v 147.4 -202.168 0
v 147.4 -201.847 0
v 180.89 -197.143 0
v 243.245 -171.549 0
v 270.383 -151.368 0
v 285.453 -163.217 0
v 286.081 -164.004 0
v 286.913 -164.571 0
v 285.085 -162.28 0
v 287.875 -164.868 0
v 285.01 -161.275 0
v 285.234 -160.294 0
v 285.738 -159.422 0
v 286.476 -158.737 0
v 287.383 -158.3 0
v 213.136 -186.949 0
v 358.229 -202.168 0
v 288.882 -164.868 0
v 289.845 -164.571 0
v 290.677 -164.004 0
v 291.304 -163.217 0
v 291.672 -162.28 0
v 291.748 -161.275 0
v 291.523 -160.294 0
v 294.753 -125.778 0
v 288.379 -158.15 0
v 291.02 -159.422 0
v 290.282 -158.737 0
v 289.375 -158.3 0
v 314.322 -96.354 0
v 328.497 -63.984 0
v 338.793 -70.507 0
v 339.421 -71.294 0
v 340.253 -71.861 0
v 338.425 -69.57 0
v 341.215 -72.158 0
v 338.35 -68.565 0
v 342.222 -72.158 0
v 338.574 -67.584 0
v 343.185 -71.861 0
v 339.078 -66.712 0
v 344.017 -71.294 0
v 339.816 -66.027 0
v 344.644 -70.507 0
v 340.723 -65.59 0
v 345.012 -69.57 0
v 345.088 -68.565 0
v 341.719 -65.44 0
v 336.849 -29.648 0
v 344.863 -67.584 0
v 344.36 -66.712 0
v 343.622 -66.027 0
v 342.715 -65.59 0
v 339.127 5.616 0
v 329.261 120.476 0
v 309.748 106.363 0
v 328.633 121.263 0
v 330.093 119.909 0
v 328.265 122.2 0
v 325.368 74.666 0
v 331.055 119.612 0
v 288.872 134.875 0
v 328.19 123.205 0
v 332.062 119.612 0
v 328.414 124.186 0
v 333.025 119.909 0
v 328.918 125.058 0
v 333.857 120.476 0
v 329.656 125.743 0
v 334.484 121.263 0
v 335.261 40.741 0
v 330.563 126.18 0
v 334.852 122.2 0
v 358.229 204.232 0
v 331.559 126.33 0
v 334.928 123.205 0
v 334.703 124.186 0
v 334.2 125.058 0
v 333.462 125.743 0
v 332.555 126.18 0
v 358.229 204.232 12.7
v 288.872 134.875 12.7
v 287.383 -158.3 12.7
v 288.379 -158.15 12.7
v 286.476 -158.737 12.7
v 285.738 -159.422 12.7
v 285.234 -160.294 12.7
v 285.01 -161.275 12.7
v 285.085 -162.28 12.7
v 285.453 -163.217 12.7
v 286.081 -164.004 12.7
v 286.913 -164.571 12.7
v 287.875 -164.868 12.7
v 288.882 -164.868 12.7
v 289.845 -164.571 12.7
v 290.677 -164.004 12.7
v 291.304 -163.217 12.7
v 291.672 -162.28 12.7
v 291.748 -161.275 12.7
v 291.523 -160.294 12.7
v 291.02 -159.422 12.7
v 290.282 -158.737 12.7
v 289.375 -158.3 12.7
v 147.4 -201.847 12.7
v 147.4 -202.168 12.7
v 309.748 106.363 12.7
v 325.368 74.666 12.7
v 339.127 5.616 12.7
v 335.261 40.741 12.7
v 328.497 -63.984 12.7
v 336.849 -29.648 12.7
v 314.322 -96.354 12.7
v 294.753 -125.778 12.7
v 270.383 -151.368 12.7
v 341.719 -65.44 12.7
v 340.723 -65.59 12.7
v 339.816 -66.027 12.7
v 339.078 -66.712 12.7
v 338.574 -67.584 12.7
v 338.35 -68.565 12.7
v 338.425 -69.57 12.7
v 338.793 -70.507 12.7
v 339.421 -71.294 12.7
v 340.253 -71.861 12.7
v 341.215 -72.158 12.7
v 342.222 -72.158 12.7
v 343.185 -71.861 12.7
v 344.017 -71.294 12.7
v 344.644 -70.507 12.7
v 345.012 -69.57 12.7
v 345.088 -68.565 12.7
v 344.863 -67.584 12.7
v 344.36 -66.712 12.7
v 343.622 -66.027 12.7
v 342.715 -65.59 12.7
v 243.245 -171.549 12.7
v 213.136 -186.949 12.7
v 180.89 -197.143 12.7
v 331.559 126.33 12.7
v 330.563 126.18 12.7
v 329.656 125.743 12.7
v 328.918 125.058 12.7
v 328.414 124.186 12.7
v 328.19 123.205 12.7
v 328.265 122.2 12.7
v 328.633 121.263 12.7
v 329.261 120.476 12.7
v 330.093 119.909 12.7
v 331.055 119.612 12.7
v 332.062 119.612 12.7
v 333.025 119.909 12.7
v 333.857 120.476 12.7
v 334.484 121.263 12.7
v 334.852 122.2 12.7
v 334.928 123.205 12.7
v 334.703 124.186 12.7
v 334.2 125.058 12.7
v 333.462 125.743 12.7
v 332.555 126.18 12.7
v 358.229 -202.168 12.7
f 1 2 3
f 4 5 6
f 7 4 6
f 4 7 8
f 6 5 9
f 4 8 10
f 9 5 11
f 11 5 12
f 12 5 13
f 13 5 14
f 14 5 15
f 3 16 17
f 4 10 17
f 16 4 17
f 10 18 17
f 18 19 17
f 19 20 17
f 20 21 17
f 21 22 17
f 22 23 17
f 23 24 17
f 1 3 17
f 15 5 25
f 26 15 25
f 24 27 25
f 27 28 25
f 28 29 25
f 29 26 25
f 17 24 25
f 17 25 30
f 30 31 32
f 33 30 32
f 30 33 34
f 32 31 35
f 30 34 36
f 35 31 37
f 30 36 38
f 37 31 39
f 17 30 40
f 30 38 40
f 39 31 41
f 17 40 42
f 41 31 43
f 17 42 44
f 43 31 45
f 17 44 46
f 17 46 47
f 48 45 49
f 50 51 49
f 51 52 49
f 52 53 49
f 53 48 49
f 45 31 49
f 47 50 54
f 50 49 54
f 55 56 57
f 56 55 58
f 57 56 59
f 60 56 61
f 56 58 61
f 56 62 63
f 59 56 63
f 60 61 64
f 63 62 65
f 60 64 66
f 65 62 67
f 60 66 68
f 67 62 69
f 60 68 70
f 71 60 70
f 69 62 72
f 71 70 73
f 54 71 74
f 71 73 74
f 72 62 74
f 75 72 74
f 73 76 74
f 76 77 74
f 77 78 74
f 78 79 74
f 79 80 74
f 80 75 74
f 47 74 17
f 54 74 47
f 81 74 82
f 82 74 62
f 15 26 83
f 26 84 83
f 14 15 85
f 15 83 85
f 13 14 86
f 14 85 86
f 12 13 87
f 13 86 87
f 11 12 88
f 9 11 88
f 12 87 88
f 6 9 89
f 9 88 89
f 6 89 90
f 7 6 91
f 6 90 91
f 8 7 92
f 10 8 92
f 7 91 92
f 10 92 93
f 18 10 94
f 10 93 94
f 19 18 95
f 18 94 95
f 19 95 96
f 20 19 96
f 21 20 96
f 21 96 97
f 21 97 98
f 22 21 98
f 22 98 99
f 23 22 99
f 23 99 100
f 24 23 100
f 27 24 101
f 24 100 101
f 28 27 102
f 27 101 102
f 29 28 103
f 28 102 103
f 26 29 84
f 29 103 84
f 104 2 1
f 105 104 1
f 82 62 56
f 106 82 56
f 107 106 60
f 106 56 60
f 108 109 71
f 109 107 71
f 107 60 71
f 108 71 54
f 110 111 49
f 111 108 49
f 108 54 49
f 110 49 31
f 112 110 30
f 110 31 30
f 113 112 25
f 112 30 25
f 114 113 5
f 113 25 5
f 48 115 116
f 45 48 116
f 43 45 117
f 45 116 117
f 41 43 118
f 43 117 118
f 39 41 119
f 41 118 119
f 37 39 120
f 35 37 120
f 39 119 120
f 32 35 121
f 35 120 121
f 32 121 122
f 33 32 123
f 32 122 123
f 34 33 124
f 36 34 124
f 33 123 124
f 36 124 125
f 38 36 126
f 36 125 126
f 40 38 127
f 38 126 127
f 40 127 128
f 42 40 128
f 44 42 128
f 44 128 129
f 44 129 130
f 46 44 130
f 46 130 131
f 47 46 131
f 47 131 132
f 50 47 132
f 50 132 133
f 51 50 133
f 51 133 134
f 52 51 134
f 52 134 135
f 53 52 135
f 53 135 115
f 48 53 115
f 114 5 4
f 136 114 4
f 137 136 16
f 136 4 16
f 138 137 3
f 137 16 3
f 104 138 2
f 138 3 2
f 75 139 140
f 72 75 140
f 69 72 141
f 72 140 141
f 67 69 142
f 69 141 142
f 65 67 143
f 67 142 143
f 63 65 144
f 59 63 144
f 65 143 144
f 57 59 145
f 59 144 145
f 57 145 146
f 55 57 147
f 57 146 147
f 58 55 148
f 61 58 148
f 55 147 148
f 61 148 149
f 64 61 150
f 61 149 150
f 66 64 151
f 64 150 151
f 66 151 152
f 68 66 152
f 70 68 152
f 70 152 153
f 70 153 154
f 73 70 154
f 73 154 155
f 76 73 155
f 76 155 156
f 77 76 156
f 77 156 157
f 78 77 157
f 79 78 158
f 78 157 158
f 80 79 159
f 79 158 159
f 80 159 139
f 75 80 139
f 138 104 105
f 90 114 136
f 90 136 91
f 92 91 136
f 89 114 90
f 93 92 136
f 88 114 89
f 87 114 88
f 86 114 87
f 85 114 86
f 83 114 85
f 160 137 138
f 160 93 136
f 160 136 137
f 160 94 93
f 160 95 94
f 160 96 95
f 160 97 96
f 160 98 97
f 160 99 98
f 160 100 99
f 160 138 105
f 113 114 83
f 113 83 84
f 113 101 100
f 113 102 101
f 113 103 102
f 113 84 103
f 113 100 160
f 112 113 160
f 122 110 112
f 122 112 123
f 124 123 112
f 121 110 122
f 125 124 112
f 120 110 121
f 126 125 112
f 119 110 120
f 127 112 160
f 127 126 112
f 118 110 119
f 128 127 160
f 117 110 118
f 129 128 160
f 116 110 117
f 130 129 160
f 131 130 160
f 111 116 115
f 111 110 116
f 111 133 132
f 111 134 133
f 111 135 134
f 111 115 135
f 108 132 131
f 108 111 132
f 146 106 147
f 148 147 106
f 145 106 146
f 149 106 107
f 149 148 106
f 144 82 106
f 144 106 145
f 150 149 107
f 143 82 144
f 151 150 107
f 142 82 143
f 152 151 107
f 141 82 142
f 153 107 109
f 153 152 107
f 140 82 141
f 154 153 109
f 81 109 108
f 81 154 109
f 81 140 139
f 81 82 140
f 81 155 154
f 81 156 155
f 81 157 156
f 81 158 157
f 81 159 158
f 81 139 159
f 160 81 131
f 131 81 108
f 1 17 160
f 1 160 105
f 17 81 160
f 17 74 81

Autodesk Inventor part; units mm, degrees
ref_plane "YZ Plane" through (0, 0, 0) normal (1, 0, 0) x (0, 1, 0)
ref_plane "XZ Plane" through (0, 0, 0) normal (0, 1, 0) x (-1, 0, 0)
ref_plane "XY Plane" through (0, 0, 0) normal (0, 0, 1) x (1, 0, 0)
sketch "Sketch1" plane through (0, 0, 0) normal (0, 0, 1) x (1, 0, 0)
  arc A0 (270.3829, -151.3678) -> (288.8718, 134.8752) centre (135.9788, 1.0322) ccw
  line L0 (358.2288, 204.2322) -> (358.2288, -202.1678)
  line L1 (358.2288, -202.1678) -> (147.3998, -202.1678)
  line L2 (147.3998, 204.2322) -> (553.7998, 204.2322) construction
  arc A1 (147.3998, -201.8466) -> (288.8718, 134.8752) centre (135.9788, 1.0322) ccw
  line L3 (147.3998, -201.8466) -> (147.3998, -202.1678)
  line L4 (358.2288, 204.2322) -> (288.8718, 134.8752)
  line L5 (358.2288, 204.2322) -> (456.3143, 204.2322) construction
  point P0 (270.3829, 153.4322)
  dimension "d5" = 203.2
  dimension "d9" = 135
extrude "Extrusion1" add sketch "Sketch1" along normal blind 12.7
sketch "Sketch2" plane through (0, 0, 0) normal (0, 0, -1) x (-1, 0, 0)
  line L0 (-358.2288, -202.1678) -> (-358.2288, 204.2322) projected
  line L1 (-147.3998, -202.1678) -> (-358.2288, -202.1678) projected
  point P0 (0, 0)
  point P1 (-288.3788, -161.5278)
  point P2 (-341.7188, -68.8178)
  point P3 (-331.5588, 122.9522)
  dimension "d10" = 69.85
  dimension "d11" = 40.64
  dimension "d12" = 16.51
  dimension "d13" = 133.35
  dimension "d14" = 325.12
  dimension "d15" = 26.67
hole "Hole1" at (288.3788, -161.5278, 0) at (341.7188, -68.8178, 0) at (331.5588, 122.9522, 0) direction (0, 0, 1) diameter 6.7564 end through all
properties part number "Hood (inside)" material "Wood (Oak)"
